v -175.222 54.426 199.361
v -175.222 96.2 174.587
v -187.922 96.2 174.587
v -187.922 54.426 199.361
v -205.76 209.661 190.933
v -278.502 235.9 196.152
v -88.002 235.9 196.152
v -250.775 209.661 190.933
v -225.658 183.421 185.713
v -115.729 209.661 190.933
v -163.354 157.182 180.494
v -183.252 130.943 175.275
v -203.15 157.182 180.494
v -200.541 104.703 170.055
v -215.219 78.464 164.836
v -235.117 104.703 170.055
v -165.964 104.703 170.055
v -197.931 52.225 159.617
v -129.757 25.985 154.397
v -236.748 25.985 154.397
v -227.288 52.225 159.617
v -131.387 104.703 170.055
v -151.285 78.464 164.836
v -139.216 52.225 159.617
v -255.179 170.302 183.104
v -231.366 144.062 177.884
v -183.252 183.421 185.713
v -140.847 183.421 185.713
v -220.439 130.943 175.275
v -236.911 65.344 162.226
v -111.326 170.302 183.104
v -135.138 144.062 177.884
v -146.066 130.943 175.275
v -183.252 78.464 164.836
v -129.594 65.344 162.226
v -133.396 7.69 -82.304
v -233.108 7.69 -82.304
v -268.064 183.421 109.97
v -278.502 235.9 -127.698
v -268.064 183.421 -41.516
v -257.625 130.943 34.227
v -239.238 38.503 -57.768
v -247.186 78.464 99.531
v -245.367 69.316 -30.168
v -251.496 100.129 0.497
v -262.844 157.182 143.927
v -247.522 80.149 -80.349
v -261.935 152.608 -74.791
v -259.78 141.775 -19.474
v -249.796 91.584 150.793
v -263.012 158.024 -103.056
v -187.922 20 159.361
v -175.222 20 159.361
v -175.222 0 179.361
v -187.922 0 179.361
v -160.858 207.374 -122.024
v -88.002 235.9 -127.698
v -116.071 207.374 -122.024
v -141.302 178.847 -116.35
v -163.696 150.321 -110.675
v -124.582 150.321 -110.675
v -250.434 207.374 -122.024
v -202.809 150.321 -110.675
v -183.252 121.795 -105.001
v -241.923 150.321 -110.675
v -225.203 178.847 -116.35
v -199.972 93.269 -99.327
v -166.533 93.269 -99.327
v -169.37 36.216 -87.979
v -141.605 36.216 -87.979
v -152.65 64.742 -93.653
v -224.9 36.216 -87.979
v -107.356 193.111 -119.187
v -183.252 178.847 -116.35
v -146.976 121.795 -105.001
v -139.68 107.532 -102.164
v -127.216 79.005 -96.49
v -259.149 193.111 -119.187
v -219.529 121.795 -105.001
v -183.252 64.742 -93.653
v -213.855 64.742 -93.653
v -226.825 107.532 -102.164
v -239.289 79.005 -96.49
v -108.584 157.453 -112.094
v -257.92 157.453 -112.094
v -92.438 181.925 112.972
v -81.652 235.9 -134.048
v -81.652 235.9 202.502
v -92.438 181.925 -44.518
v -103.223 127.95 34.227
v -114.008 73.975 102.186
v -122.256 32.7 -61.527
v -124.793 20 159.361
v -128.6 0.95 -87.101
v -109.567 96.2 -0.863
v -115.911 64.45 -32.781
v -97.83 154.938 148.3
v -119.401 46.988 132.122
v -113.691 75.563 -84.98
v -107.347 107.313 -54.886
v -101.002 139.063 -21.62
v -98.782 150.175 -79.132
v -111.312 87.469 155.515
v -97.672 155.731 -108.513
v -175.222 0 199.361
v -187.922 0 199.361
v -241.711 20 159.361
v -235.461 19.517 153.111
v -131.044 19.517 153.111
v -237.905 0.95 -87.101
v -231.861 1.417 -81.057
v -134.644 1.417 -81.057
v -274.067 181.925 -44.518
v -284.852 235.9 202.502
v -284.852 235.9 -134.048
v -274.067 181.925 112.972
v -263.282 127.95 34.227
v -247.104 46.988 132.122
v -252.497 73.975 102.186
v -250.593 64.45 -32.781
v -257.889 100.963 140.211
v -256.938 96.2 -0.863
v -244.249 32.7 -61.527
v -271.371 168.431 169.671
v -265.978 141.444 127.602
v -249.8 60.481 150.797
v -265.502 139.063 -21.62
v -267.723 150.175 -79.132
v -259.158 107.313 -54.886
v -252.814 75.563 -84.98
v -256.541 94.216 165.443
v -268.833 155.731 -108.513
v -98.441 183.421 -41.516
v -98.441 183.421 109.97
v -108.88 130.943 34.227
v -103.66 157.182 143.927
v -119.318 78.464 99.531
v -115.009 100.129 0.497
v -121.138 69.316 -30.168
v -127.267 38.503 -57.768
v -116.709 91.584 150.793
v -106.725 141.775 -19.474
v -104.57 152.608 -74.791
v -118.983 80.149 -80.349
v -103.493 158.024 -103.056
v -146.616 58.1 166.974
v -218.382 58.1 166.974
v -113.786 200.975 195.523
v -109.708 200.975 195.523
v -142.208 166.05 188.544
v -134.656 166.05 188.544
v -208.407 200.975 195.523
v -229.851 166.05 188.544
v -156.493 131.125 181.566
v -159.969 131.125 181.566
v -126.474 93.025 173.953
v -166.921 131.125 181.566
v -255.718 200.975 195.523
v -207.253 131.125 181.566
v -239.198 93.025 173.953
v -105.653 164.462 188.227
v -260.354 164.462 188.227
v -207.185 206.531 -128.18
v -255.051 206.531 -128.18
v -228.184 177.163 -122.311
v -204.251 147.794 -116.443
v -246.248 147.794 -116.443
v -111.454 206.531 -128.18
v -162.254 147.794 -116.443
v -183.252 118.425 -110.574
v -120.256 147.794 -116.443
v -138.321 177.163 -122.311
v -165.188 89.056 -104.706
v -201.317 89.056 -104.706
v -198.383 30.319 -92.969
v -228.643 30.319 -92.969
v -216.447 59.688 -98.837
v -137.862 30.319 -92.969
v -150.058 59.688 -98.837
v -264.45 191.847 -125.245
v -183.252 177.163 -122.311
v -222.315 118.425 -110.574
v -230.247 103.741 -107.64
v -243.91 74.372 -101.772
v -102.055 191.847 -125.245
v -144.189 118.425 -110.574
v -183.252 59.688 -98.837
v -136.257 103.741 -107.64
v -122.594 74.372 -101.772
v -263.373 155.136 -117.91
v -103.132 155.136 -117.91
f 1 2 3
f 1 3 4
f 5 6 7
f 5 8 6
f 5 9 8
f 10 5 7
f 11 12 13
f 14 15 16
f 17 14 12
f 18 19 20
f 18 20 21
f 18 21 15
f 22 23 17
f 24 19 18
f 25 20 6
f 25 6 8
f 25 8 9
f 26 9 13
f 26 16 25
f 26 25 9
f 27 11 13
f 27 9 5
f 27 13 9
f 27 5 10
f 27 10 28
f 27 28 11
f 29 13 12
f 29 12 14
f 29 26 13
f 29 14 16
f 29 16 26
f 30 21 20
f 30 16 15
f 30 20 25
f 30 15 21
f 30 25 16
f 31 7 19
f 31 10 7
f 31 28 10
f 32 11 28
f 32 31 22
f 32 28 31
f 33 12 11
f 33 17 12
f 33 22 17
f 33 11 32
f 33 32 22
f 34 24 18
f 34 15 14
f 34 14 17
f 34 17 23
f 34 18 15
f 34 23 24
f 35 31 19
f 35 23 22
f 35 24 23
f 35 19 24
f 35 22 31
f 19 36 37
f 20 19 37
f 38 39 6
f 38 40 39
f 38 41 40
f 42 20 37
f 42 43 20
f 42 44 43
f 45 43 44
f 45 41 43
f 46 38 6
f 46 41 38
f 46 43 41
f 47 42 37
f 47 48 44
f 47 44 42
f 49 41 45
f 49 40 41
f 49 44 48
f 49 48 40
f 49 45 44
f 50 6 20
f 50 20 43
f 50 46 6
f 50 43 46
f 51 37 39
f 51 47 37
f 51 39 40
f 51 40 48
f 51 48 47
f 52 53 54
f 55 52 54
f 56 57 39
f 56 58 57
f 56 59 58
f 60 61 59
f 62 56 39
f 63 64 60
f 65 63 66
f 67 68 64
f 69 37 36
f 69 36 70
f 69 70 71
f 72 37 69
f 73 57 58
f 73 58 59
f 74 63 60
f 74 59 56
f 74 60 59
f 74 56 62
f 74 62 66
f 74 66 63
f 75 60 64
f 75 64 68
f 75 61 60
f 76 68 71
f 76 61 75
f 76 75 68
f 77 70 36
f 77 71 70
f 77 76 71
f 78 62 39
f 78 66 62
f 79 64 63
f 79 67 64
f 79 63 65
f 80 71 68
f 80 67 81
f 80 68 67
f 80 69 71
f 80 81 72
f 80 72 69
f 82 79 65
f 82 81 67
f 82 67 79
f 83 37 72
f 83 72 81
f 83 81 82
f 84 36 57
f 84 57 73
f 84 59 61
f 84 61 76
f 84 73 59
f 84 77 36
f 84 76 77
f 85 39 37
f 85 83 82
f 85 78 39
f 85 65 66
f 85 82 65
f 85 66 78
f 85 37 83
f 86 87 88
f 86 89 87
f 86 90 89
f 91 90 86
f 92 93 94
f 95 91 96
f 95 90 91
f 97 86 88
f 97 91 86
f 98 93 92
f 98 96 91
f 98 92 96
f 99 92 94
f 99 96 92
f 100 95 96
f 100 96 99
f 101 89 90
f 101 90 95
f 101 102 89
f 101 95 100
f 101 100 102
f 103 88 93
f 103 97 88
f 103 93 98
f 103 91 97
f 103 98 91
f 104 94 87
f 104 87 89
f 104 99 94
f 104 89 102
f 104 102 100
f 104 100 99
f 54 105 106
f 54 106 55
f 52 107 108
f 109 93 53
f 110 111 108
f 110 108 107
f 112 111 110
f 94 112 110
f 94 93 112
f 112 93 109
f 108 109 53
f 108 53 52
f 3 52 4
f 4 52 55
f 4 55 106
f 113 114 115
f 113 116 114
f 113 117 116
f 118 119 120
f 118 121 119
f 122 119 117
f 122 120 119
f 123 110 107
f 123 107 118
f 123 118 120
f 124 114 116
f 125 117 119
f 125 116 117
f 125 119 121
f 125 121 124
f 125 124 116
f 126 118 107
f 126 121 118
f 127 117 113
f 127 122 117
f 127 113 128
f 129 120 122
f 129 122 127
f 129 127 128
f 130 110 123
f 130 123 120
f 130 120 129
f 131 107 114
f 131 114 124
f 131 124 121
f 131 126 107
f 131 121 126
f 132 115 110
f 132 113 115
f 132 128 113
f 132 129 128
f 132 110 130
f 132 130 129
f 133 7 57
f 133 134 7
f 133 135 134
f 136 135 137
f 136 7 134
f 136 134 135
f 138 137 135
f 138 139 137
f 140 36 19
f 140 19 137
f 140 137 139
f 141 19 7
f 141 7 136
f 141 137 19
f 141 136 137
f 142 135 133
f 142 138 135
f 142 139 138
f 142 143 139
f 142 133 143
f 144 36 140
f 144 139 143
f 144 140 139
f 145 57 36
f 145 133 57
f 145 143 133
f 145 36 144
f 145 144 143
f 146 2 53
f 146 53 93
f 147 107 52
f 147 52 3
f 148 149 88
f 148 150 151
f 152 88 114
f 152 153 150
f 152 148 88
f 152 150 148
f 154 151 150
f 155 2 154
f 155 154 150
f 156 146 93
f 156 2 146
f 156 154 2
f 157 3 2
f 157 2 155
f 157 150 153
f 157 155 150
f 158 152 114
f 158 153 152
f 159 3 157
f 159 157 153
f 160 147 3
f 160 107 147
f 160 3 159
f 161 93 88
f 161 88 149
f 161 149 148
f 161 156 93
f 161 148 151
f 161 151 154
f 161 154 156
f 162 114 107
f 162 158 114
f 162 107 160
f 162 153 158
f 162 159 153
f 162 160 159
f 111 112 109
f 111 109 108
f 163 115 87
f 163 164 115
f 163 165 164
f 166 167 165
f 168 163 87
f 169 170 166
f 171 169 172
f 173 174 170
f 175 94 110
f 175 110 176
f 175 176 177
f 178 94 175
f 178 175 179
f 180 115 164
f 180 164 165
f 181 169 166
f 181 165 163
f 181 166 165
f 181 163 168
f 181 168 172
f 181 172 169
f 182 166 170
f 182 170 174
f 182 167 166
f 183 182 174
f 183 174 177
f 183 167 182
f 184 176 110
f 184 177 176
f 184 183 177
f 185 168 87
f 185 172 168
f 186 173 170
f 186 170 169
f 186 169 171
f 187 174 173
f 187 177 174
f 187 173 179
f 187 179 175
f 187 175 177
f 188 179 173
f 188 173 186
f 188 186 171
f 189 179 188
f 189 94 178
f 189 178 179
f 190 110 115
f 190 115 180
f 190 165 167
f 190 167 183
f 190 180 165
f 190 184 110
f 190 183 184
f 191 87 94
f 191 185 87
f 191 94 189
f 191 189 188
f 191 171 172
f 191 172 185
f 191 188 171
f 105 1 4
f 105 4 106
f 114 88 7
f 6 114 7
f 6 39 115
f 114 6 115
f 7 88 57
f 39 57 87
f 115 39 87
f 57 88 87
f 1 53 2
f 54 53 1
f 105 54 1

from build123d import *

# Parameters (mm, degrees)
SKETCH1_W             = 203.2
SKETCH1_H             = 336.55
BOSS_EXTRUDE4_DEPTH   = 254
BOSS_EXTRUDE4_TAPER   = 11.3
SKETCH3_W             = 190.5
SKETCH3_H             = 323.85
CUT_EXTRUDE1_DEPTH    = 247.65
CUT_EXTRUDE1_TAPER    = 11.25
CUT_EXTRUDE13_DEPTH   = 254
BOSS_EXTRUDE6_START   = 102.7176
BOSS_EXTRUDE6_DEPTH   = 12.7
BOSS_EXTRUDE7_DEPTH   = 6.35
BODY_MOVE_COPY1_ANGLE = 180
BODY_MOVE_COPY2_ANGLE = 180


with BuildPart() as part:
    # Sketch1 → Boss-Extrude4 (new body)
    with BuildSketch(Plane(origin=(0, 0, 0), x_dir=(1, 0, 0), z_dir=(0, 1, 0))):
        with Locations((-183.252356021, -34.226832461)):
            Rectangle(SKETCH1_W, SKETCH1_H)
    extrude(amount=BOSS_EXTRUDE4_DEPTH, taper=BOSS_EXTRUDE4_TAPER)

    # Sketch3 → Cut-Extrude1 (cut)
    with BuildSketch(Plane.XZ):
        with Locations((-183.252356021, 34.226832461)):
            Rectangle(SKETCH3_W, SKETCH3_H)
    extrude(amount=-CUT_EXTRUDE1_DEPTH, taper=CUT_EXTRUDE1_TAPER, mode=Mode.SUBTRACT)

    # Sketch15 → Cut-Extrude13 (cut)
    with BuildSketch(Plane(origin=(-294, 0, 0), x_dir=(0, 0, -1), z_dir=(1, 0, 0))):
        Polygon((83.293959244, 254), (-151.747624165, 254), (-159.360755409, 215.9), (87.100524866, 234.95), align=None)
    extrude(amount=CUT_EXTRUDE13_DEPTH, mode=Mode.SUBTRACT)

    # Sketch21 → Boss-Extrude6 (add)
    with BuildSketch(Plane(origin=(-294, 0, 0), x_dir=(0, 0, -1), z_dir=(1, 0, 0)).offset(BOSS_EXTRUDE6_START)):
        Polygon((-174.587017898, 139.7), (-199.360755409, 181.473734378), (-199.360755409, 235.9), (-179.360755409, 235.9), (-179.360755409, 215.9), (-159.360755409, 215.9), align=None)
        Polygon((-179.360755409, 235.9), (-179.360755409, 215.9), (-159.360755409, 215.9), align=None)
    extrude(amount=BOSS_EXTRUDE6_DEPTH)

    # Sketch22 → Boss-Extrude7 (add)
    with BuildSketch(Plane(origin=(0, 226.862283718, 17.535113426), x_dir=(1, 0, 0), z_dir=(0, 0.997026131, 0.077064226))):
        Polygon((-237.904713348, 104.947739163), (-241.71127897, -142.248670954), (-124.793433072, -142.248670954), (-128.599998694, 104.947739163), align=None)
    extrude(amount=-BOSS_EXTRUDE7_DEPTH)


with BuildPart() as part_1:
    # Body-Move/Copy1: moved
    add(part.part.rotate(Axis((0, 117.95, 34.226832461), (1, 0, 0)), BODY_MOVE_COPY1_ANGLE))


with BuildPart() as part_2:
    # Body-Move/Copy2: moved
    add(part_1.part.rotate(Axis((-183.252356021, 0, 34.226832461), (0, 1, 0)), BODY_MOVE_COPY2_ANGLE))


solid = part_2.part
